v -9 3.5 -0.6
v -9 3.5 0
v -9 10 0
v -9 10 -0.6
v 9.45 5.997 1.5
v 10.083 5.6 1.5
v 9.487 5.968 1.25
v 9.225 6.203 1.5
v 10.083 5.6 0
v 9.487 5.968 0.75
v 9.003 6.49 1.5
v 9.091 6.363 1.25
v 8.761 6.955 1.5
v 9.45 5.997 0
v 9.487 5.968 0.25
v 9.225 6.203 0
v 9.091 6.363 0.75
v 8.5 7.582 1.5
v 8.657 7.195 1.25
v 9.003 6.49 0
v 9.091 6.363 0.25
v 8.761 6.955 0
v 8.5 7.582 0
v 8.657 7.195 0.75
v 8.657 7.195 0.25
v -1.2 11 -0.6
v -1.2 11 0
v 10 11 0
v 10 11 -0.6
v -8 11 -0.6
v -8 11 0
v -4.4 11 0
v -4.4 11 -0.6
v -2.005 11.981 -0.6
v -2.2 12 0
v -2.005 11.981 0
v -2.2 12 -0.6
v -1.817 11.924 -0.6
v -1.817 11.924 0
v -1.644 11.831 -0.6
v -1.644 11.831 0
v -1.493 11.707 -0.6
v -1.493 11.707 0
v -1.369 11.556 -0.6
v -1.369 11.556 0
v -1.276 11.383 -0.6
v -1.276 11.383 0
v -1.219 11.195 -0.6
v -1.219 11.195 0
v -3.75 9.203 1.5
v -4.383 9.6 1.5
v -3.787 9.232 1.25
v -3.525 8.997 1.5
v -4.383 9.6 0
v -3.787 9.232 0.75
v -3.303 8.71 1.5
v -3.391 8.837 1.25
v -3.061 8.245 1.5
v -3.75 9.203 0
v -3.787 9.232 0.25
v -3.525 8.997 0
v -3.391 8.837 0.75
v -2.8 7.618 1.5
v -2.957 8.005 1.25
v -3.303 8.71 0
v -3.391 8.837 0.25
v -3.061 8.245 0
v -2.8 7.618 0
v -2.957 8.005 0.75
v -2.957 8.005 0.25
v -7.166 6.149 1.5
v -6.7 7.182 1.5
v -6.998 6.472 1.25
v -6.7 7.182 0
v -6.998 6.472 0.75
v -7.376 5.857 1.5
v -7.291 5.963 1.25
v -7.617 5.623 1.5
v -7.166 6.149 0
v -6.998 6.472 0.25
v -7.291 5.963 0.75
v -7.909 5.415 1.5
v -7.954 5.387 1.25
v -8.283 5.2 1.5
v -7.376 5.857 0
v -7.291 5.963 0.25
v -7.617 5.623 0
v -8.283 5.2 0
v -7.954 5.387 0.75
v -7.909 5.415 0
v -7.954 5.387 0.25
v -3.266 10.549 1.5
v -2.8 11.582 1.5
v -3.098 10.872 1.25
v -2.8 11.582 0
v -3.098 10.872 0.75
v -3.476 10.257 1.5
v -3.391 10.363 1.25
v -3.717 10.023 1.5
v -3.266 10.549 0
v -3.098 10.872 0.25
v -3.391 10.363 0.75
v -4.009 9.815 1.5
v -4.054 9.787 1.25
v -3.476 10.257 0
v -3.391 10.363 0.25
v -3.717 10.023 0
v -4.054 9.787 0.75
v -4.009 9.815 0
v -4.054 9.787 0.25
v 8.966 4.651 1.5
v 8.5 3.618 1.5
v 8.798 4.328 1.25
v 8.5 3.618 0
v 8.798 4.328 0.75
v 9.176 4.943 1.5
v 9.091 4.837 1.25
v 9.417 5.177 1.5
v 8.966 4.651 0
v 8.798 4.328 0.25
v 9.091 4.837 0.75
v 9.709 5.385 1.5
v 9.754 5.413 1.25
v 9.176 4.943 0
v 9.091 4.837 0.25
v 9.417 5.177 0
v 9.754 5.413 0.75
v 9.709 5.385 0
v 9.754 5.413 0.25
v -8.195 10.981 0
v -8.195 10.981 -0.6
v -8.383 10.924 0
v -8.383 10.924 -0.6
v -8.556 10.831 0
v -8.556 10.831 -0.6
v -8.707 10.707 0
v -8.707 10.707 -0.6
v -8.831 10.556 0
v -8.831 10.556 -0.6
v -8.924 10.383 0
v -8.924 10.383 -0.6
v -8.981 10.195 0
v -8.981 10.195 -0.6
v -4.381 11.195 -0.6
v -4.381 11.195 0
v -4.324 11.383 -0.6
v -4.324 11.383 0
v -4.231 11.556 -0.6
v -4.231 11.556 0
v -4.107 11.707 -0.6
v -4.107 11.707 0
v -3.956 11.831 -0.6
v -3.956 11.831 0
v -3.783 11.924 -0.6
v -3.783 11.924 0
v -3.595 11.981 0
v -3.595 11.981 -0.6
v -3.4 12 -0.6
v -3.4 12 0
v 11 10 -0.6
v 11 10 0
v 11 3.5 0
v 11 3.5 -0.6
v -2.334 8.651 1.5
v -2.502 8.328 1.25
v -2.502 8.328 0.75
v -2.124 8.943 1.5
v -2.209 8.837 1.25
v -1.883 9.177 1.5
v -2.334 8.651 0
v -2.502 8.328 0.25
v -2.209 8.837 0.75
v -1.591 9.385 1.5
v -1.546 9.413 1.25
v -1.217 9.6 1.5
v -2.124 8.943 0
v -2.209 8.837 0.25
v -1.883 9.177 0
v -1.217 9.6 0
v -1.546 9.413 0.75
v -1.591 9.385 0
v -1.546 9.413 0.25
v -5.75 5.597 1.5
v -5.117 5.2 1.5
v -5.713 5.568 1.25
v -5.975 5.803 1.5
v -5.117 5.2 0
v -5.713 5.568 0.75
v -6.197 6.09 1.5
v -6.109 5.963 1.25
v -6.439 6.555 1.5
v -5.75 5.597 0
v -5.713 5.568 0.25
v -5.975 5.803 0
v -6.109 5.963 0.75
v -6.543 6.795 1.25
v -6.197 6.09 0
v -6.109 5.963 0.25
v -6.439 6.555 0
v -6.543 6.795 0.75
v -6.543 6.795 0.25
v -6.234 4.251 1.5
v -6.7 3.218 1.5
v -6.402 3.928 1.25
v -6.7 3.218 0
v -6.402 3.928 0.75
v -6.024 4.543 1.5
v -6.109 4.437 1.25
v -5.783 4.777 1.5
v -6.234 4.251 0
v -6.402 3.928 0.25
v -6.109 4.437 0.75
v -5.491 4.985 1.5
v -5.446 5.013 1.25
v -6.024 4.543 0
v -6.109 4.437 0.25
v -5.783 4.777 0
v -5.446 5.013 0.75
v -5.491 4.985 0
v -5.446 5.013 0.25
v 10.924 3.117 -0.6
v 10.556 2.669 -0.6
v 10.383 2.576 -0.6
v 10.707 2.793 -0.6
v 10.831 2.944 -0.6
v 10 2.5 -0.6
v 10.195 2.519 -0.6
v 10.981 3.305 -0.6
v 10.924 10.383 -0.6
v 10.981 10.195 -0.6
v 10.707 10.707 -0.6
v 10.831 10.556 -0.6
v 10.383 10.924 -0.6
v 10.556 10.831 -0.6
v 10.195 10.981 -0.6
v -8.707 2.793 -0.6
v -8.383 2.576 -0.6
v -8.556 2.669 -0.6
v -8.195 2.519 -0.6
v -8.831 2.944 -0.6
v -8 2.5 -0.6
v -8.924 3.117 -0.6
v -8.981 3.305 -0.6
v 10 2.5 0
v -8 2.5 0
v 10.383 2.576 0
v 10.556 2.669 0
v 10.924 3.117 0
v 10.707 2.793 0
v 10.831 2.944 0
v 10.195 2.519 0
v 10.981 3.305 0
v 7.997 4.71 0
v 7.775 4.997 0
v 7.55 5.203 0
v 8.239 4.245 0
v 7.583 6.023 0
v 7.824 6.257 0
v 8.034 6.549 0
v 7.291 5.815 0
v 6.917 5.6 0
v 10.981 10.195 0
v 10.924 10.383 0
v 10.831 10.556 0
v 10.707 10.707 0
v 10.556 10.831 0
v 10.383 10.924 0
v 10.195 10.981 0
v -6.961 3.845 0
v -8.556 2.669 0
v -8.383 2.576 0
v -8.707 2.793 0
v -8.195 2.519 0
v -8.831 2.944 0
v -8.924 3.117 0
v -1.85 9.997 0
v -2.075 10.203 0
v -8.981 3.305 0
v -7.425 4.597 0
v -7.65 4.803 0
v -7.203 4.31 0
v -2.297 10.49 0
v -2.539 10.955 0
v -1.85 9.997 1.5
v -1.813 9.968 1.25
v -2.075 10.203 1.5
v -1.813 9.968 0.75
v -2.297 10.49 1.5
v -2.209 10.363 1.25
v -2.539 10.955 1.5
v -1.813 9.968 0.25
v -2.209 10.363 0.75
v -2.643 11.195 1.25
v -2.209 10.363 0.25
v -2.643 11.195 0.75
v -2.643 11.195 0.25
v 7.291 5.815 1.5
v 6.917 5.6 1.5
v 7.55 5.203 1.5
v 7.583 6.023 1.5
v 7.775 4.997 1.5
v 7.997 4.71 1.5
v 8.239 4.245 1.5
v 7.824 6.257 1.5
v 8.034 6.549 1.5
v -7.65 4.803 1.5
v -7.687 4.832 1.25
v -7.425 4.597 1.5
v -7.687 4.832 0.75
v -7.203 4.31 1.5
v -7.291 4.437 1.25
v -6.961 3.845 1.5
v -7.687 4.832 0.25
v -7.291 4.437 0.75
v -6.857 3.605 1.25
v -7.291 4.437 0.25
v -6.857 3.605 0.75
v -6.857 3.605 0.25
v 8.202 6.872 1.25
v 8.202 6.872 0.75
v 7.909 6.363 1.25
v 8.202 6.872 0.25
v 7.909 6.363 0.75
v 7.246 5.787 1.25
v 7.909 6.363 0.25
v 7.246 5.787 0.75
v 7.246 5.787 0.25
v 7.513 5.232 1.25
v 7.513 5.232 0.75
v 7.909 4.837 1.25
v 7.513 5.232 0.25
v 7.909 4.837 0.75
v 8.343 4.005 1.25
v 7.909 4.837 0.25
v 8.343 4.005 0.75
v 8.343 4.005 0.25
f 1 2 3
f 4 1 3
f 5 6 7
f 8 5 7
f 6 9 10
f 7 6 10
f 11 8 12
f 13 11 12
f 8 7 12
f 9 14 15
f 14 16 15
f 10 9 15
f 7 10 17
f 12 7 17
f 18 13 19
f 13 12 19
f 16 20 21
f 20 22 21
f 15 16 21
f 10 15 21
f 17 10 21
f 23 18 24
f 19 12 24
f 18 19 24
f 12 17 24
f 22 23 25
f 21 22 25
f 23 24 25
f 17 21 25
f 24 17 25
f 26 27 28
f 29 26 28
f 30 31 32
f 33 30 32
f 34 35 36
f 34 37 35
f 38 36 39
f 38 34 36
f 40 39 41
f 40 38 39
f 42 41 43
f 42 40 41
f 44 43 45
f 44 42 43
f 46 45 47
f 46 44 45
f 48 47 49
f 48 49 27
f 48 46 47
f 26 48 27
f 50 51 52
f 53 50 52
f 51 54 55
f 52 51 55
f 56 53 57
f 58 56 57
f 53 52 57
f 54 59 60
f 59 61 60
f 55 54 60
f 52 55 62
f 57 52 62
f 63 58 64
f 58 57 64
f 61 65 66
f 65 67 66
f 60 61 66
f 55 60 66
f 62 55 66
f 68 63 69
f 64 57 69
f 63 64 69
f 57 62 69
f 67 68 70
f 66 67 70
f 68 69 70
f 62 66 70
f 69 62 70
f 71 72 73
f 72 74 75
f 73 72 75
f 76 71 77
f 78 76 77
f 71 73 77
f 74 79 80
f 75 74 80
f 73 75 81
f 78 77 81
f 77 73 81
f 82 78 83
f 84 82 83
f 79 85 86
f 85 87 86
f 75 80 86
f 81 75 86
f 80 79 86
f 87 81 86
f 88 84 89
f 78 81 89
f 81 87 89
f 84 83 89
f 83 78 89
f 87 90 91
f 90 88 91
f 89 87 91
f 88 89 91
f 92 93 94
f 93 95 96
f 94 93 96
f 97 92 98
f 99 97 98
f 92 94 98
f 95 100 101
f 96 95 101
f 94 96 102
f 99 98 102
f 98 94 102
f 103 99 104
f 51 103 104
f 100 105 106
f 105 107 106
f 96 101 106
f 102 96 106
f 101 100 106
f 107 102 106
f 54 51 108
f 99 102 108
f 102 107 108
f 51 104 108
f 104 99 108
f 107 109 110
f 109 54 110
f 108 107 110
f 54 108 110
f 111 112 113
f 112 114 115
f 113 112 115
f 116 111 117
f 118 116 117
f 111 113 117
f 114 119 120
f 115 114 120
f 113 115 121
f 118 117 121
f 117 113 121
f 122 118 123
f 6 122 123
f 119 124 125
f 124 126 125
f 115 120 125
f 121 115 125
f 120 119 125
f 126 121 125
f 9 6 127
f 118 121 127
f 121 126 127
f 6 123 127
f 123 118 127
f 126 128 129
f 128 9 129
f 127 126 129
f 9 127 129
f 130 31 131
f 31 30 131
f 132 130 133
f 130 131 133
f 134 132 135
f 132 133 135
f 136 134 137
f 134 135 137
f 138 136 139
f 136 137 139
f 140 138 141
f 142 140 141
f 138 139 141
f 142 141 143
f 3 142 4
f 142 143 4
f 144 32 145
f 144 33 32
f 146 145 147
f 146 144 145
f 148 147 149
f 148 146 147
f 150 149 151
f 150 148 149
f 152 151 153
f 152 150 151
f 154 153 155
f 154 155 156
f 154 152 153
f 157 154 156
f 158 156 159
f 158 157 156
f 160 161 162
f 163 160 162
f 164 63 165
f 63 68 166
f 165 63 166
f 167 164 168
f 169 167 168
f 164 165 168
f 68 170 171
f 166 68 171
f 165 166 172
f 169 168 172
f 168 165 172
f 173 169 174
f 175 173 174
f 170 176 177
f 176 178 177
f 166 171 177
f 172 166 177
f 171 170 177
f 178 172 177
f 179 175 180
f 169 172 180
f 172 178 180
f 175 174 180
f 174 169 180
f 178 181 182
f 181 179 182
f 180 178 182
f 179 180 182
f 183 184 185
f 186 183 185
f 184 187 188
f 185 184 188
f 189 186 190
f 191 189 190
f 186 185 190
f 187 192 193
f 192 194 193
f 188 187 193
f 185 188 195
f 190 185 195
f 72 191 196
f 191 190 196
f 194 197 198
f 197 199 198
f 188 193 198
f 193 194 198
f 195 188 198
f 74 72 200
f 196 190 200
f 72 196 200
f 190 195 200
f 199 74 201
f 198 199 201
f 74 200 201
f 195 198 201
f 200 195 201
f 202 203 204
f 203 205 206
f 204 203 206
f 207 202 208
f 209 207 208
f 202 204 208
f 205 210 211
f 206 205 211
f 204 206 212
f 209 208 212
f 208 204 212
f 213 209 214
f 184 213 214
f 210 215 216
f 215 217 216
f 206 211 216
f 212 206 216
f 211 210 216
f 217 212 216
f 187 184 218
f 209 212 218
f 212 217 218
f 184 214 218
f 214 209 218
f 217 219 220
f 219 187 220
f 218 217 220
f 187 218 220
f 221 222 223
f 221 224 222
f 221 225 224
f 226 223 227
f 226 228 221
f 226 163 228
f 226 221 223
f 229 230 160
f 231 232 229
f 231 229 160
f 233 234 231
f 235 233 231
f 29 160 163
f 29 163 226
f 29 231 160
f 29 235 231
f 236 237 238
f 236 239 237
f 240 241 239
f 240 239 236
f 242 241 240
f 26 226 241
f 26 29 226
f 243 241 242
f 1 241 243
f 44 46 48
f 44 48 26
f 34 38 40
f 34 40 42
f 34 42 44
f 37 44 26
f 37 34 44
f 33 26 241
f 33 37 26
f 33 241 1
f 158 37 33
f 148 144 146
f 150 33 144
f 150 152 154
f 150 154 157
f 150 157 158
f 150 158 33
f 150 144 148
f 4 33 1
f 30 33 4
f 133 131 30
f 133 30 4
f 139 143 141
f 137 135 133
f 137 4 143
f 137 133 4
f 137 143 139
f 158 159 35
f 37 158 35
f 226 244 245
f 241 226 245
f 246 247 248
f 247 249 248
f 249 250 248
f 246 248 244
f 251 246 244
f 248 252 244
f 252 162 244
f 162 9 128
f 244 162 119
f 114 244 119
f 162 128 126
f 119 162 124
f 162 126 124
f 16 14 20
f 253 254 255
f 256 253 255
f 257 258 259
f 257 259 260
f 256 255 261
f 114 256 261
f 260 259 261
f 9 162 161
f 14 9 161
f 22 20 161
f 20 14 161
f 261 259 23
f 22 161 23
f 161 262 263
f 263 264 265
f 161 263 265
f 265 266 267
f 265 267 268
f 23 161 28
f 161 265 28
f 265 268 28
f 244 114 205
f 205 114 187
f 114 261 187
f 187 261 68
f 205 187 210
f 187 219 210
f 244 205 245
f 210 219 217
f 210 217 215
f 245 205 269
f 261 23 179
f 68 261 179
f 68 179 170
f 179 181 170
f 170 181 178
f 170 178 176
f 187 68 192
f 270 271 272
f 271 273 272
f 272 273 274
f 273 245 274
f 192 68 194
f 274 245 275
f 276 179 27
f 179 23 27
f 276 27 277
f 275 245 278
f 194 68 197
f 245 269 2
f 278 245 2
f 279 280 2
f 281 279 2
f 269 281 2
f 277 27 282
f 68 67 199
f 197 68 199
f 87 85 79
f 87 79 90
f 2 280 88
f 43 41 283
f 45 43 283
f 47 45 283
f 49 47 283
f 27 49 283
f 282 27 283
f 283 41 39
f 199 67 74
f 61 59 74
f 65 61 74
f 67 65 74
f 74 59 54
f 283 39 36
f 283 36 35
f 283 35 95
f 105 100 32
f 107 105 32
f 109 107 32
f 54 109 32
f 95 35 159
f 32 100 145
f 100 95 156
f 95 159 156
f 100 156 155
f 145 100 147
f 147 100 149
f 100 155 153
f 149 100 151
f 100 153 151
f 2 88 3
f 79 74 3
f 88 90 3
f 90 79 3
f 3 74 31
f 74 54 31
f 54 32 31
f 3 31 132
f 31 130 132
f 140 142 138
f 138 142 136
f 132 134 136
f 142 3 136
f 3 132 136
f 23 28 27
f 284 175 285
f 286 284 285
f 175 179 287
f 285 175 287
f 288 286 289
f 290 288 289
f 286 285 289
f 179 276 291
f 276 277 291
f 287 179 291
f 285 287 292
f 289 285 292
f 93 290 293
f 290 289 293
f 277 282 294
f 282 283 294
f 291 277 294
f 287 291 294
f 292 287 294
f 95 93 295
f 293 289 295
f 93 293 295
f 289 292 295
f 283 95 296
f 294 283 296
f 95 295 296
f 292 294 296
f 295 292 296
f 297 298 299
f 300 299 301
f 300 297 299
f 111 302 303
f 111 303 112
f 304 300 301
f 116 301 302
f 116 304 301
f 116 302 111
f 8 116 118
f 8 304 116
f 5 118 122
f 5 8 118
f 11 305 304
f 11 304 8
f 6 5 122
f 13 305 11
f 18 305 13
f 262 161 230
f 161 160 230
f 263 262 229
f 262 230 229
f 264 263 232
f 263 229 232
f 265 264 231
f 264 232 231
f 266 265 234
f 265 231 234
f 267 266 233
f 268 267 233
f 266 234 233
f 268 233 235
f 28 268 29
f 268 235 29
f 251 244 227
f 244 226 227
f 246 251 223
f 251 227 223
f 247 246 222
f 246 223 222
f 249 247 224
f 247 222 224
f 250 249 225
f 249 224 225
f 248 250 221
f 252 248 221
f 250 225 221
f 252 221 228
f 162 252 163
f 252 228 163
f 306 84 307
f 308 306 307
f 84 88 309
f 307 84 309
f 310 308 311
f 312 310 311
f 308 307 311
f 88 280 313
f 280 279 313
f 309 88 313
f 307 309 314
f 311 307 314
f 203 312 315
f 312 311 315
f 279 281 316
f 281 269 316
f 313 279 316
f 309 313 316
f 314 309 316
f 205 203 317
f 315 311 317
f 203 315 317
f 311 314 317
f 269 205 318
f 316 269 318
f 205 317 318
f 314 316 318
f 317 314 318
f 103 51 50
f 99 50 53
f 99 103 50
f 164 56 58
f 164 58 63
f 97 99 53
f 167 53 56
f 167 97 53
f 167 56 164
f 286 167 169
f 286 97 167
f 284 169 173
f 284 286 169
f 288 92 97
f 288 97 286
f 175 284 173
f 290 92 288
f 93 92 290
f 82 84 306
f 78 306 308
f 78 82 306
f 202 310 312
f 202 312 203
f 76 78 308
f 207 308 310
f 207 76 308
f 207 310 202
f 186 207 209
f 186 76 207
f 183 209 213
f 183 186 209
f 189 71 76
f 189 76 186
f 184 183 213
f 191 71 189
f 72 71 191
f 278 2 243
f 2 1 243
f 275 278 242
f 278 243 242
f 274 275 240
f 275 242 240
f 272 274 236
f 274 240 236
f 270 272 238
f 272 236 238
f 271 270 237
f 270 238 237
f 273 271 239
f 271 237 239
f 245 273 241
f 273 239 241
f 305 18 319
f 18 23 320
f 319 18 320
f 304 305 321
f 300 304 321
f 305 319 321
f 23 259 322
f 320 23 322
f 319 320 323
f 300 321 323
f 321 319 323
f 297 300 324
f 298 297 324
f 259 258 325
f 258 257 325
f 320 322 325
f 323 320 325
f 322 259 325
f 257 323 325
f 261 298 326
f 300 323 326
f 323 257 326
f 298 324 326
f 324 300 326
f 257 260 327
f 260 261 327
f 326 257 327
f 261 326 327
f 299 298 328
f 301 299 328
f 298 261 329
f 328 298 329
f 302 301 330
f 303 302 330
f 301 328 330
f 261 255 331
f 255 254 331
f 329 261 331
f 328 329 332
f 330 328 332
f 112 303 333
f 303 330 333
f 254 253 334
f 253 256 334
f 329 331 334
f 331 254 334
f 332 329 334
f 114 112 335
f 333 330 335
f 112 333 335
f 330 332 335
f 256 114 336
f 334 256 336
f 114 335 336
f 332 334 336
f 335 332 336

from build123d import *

# Parameters (mm, degrees)
BOSS_EXTRUDE1_DEPTH = 0.6
BOSS_EXTRUDE2_DEPTH = 1.5
FILLET1_R           = 1


with BuildPart() as part:
    # Sketch2 → Boss-Extrude1 (new body)
    with BuildSketch(Plane.XY):
        Polygon((-9, 11), (-4.4, 11), (-4.4, 12), (-1.2, 12), (-1.2, 11), (11, 11), (11, 2.5), (-9, 2.5), align=None)
    extrude(amount=-BOSS_EXTRUDE1_DEPTH)

    # Sketch1 → Boss-Extrude2 (add)
    with BuildSketch(Plane.XY):
        with BuildLine():
            add(Edge.make_bspline(
                [(8.5, 7.582250387), (8.448081693, 7.453099482), (8.337951661, 7.179459039), (8.156392198, 6.75959463), (7.928053742, 6.343866223), (7.606398256, 6.024741111), (7.260761425, 5.790247234), (7.028066866, 5.65925749), (6.916719247, 5.6)],
                knots=[0.057904746, 0.057904746, 0.057904746, 0.057904746, 0.169421818, 0.28093889, 0.503973033, 0.727007177, 0.838524249, 0.95004132, 0.95004132, 0.95004132, 0.95004132], degree=3))
            add(Edge.make_bspline(
                [(6.916719247, 5.6), (7.028066866, 5.54074251), (7.260761425, 5.409752766), (7.606398256, 5.175258889), (7.928053742, 4.856133777), (8.156392198, 4.44040537), (8.337951661, 4.020540961), (8.448081693, 3.746900518), (8.5, 3.617749613)],
                knots=[0.057904746, 0.057904746, 0.057904746, 0.057904746, 0.169421818, 0.28093889, 0.503973033, 0.727007177, 0.838524249, 0.95004132, 0.95004132, 0.95004132, 0.95004132], degree=3))
            add(Edge.make_bspline(
                [(8.5, 3.617749613), (8.551918307, 3.746900518), (8.662048339, 4.020540961), (8.843607802, 4.44040537), (9.071946258, 4.856133777), (9.393601744, 5.175258889), (9.739238575, 5.409752766), (9.971933134, 5.54074251), (10.083280753, 5.6)],
                knots=[0.057904746, 0.057904746, 0.057904746, 0.057904746, 0.169421818, 0.28093889, 0.503973033, 0.727007177, 0.838524249, 0.95004132, 0.95004132, 0.95004132, 0.95004132], degree=3))
            add(Edge.make_bspline(
                [(10.083280753, 5.6), (9.971933134, 5.65925749), (9.739238575, 5.790247234), (9.393601744, 6.024741111), (9.071946258, 6.343866223), (8.843607802, 6.75959463), (8.662048339, 7.179459039), (8.551918307, 7.453099482), (8.5, 7.582250387)],
                knots=[0.057904746, 0.057904746, 0.057904746, 0.057904746, 0.169421818, 0.28093889, 0.503973033, 0.727007177, 0.838524249, 0.95004132, 0.95004132, 0.95004132, 0.95004132], degree=3))
        make_face()
        with BuildLine():
            add(Edge.make_bspline(
                [(-2.8, 7.617749613), (-2.748081693, 7.746900518), (-2.637951661, 8.020540961), (-2.456392198, 8.44040537), (-2.228053742, 8.856133777), (-1.906398256, 9.175258889), (-1.560761425, 9.409752766), (-1.328066866, 9.54074251), (-1.216719247, 9.6)],
                knots=[0.057904746, 0.057904746, 0.057904746, 0.057904746, 0.169421818, 0.28093889, 0.503973033, 0.727007177, 0.838524249, 0.95004132, 0.95004132, 0.95004132, 0.95004132], degree=3))
            add(Edge.make_bspline(
                [(-1.216719247, 9.6), (-1.328066866, 9.65925749), (-1.560761425, 9.790247234), (-1.906398256, 10.024741111), (-2.228053742, 10.343866223), (-2.456392198, 10.75959463), (-2.637951661, 11.179459039), (-2.748081693, 11.453099482), (-2.8, 11.582250387)],
                knots=[0.057904746, 0.057904746, 0.057904746, 0.057904746, 0.169421818, 0.28093889, 0.503973033, 0.727007177, 0.838524249, 0.95004132, 0.95004132, 0.95004132, 0.95004132], degree=3))
            add(Edge.make_bspline(
                [(-2.8, 11.582250387), (-2.851918307, 11.453099482), (-2.962048339, 11.179459039), (-3.143607802, 10.75959463), (-3.371946258, 10.343866223), (-3.693601744, 10.024741111), (-4.039238575, 9.790247234), (-4.271933134, 9.65925749), (-4.383280753, 9.6)],
                knots=[0.057904746, 0.057904746, 0.057904746, 0.057904746, 0.169421818, 0.28093889, 0.503973033, 0.727007177, 0.838524249, 0.95004132, 0.95004132, 0.95004132, 0.95004132], degree=3))
            add(Edge.make_bspline(
                [(-4.383280753, 9.6), (-4.271933134, 9.54074251), (-4.039238575, 9.409752766), (-3.693601744, 9.175258889), (-3.371946258, 8.856133777), (-3.143607802, 8.44040537), (-2.962048339, 8.020540961), (-2.851918307, 7.746900518), (-2.8, 7.617749613)],
                knots=[0.057904746, 0.057904746, 0.057904746, 0.057904746, 0.169421818, 0.28093889, 0.503973033, 0.727007177, 0.838524249, 0.95004132, 0.95004132, 0.95004132, 0.95004132], degree=3))
        make_face()
        with BuildLine():
            add(Edge.make_bspline(
                [(-6.7, 7.182250387), (-6.751918307, 7.053099482), (-6.862048339, 6.779459039), (-7.043607802, 6.35959463), (-7.271946258, 5.943866223), (-7.593601744, 5.624741111), (-7.939238575, 5.390247234), (-8.171933134, 5.25925749), (-8.283280753, 5.2)],
                knots=[0.057904746, 0.057904746, 0.057904746, 0.057904746, 0.169421818, 0.28093889, 0.503973033, 0.727007177, 0.838524249, 0.95004132, 0.95004132, 0.95004132, 0.95004132], degree=3))
            add(Edge.make_bspline(
                [(-8.283280753, 5.2), (-8.171933134, 5.14074251), (-7.939238575, 5.009752766), (-7.593601744, 4.775258889), (-7.271946258, 4.456133777), (-7.043607802, 4.04040537), (-6.862048339, 3.620540961), (-6.751918307, 3.346900518), (-6.7, 3.217749613)],
                knots=[0.057904746, 0.057904746, 0.057904746, 0.057904746, 0.169421818, 0.28093889, 0.503973033, 0.727007177, 0.838524249, 0.95004132, 0.95004132, 0.95004132, 0.95004132], degree=3))
            add(Edge.make_bspline(
                [(-6.7, 3.217749613), (-6.648081693, 3.346900518), (-6.537951661, 3.620540961), (-6.356392198, 4.04040537), (-6.128053742, 4.456133777), (-5.806398256, 4.775258889), (-5.460761425, 5.009752766), (-5.228066866, 5.14074251), (-5.116719247, 5.2)],
                knots=[0.057904746, 0.057904746, 0.057904746, 0.057904746, 0.169421818, 0.28093889, 0.503973033, 0.727007177, 0.838524249, 0.95004132, 0.95004132, 0.95004132, 0.95004132], degree=3))
            add(Edge.make_bspline(
                [(-5.116719247, 5.2), (-5.228066866, 5.25925749), (-5.460761425, 5.390247234), (-5.806398256, 5.624741111), (-6.128053742, 5.943866223), (-6.356392198, 6.35959463), (-6.537951661, 6.779459039), (-6.648081693, 7.053099482), (-6.7, 7.182250387)],
                knots=[0.057904746, 0.057904746, 0.057904746, 0.057904746, 0.169421818, 0.28093889, 0.503973033, 0.727007177, 0.838524249, 0.95004132, 0.95004132, 0.95004132, 0.95004132], degree=3))
        make_face()
    extrude(amount=BOSS_EXTRUDE2_DEPTH)

    # Fillet1
    fillet1_edges = [part.edges().sort_by_distance(p)[0] for p in [
        (-9, 2.5, -0.3),
        (11, 2.5, -0.3),
        (11, 11, -0.3),
        (-1.2, 12, -0.3),
        (-4.4, 12, -0.3),
        (-9, 11, -0.3),
    ]]
    fillet(fillet1_edges, radius=FILLET1_R - 0.0001)  # a hair under: the kernel refuses the full size


solid = part.part
